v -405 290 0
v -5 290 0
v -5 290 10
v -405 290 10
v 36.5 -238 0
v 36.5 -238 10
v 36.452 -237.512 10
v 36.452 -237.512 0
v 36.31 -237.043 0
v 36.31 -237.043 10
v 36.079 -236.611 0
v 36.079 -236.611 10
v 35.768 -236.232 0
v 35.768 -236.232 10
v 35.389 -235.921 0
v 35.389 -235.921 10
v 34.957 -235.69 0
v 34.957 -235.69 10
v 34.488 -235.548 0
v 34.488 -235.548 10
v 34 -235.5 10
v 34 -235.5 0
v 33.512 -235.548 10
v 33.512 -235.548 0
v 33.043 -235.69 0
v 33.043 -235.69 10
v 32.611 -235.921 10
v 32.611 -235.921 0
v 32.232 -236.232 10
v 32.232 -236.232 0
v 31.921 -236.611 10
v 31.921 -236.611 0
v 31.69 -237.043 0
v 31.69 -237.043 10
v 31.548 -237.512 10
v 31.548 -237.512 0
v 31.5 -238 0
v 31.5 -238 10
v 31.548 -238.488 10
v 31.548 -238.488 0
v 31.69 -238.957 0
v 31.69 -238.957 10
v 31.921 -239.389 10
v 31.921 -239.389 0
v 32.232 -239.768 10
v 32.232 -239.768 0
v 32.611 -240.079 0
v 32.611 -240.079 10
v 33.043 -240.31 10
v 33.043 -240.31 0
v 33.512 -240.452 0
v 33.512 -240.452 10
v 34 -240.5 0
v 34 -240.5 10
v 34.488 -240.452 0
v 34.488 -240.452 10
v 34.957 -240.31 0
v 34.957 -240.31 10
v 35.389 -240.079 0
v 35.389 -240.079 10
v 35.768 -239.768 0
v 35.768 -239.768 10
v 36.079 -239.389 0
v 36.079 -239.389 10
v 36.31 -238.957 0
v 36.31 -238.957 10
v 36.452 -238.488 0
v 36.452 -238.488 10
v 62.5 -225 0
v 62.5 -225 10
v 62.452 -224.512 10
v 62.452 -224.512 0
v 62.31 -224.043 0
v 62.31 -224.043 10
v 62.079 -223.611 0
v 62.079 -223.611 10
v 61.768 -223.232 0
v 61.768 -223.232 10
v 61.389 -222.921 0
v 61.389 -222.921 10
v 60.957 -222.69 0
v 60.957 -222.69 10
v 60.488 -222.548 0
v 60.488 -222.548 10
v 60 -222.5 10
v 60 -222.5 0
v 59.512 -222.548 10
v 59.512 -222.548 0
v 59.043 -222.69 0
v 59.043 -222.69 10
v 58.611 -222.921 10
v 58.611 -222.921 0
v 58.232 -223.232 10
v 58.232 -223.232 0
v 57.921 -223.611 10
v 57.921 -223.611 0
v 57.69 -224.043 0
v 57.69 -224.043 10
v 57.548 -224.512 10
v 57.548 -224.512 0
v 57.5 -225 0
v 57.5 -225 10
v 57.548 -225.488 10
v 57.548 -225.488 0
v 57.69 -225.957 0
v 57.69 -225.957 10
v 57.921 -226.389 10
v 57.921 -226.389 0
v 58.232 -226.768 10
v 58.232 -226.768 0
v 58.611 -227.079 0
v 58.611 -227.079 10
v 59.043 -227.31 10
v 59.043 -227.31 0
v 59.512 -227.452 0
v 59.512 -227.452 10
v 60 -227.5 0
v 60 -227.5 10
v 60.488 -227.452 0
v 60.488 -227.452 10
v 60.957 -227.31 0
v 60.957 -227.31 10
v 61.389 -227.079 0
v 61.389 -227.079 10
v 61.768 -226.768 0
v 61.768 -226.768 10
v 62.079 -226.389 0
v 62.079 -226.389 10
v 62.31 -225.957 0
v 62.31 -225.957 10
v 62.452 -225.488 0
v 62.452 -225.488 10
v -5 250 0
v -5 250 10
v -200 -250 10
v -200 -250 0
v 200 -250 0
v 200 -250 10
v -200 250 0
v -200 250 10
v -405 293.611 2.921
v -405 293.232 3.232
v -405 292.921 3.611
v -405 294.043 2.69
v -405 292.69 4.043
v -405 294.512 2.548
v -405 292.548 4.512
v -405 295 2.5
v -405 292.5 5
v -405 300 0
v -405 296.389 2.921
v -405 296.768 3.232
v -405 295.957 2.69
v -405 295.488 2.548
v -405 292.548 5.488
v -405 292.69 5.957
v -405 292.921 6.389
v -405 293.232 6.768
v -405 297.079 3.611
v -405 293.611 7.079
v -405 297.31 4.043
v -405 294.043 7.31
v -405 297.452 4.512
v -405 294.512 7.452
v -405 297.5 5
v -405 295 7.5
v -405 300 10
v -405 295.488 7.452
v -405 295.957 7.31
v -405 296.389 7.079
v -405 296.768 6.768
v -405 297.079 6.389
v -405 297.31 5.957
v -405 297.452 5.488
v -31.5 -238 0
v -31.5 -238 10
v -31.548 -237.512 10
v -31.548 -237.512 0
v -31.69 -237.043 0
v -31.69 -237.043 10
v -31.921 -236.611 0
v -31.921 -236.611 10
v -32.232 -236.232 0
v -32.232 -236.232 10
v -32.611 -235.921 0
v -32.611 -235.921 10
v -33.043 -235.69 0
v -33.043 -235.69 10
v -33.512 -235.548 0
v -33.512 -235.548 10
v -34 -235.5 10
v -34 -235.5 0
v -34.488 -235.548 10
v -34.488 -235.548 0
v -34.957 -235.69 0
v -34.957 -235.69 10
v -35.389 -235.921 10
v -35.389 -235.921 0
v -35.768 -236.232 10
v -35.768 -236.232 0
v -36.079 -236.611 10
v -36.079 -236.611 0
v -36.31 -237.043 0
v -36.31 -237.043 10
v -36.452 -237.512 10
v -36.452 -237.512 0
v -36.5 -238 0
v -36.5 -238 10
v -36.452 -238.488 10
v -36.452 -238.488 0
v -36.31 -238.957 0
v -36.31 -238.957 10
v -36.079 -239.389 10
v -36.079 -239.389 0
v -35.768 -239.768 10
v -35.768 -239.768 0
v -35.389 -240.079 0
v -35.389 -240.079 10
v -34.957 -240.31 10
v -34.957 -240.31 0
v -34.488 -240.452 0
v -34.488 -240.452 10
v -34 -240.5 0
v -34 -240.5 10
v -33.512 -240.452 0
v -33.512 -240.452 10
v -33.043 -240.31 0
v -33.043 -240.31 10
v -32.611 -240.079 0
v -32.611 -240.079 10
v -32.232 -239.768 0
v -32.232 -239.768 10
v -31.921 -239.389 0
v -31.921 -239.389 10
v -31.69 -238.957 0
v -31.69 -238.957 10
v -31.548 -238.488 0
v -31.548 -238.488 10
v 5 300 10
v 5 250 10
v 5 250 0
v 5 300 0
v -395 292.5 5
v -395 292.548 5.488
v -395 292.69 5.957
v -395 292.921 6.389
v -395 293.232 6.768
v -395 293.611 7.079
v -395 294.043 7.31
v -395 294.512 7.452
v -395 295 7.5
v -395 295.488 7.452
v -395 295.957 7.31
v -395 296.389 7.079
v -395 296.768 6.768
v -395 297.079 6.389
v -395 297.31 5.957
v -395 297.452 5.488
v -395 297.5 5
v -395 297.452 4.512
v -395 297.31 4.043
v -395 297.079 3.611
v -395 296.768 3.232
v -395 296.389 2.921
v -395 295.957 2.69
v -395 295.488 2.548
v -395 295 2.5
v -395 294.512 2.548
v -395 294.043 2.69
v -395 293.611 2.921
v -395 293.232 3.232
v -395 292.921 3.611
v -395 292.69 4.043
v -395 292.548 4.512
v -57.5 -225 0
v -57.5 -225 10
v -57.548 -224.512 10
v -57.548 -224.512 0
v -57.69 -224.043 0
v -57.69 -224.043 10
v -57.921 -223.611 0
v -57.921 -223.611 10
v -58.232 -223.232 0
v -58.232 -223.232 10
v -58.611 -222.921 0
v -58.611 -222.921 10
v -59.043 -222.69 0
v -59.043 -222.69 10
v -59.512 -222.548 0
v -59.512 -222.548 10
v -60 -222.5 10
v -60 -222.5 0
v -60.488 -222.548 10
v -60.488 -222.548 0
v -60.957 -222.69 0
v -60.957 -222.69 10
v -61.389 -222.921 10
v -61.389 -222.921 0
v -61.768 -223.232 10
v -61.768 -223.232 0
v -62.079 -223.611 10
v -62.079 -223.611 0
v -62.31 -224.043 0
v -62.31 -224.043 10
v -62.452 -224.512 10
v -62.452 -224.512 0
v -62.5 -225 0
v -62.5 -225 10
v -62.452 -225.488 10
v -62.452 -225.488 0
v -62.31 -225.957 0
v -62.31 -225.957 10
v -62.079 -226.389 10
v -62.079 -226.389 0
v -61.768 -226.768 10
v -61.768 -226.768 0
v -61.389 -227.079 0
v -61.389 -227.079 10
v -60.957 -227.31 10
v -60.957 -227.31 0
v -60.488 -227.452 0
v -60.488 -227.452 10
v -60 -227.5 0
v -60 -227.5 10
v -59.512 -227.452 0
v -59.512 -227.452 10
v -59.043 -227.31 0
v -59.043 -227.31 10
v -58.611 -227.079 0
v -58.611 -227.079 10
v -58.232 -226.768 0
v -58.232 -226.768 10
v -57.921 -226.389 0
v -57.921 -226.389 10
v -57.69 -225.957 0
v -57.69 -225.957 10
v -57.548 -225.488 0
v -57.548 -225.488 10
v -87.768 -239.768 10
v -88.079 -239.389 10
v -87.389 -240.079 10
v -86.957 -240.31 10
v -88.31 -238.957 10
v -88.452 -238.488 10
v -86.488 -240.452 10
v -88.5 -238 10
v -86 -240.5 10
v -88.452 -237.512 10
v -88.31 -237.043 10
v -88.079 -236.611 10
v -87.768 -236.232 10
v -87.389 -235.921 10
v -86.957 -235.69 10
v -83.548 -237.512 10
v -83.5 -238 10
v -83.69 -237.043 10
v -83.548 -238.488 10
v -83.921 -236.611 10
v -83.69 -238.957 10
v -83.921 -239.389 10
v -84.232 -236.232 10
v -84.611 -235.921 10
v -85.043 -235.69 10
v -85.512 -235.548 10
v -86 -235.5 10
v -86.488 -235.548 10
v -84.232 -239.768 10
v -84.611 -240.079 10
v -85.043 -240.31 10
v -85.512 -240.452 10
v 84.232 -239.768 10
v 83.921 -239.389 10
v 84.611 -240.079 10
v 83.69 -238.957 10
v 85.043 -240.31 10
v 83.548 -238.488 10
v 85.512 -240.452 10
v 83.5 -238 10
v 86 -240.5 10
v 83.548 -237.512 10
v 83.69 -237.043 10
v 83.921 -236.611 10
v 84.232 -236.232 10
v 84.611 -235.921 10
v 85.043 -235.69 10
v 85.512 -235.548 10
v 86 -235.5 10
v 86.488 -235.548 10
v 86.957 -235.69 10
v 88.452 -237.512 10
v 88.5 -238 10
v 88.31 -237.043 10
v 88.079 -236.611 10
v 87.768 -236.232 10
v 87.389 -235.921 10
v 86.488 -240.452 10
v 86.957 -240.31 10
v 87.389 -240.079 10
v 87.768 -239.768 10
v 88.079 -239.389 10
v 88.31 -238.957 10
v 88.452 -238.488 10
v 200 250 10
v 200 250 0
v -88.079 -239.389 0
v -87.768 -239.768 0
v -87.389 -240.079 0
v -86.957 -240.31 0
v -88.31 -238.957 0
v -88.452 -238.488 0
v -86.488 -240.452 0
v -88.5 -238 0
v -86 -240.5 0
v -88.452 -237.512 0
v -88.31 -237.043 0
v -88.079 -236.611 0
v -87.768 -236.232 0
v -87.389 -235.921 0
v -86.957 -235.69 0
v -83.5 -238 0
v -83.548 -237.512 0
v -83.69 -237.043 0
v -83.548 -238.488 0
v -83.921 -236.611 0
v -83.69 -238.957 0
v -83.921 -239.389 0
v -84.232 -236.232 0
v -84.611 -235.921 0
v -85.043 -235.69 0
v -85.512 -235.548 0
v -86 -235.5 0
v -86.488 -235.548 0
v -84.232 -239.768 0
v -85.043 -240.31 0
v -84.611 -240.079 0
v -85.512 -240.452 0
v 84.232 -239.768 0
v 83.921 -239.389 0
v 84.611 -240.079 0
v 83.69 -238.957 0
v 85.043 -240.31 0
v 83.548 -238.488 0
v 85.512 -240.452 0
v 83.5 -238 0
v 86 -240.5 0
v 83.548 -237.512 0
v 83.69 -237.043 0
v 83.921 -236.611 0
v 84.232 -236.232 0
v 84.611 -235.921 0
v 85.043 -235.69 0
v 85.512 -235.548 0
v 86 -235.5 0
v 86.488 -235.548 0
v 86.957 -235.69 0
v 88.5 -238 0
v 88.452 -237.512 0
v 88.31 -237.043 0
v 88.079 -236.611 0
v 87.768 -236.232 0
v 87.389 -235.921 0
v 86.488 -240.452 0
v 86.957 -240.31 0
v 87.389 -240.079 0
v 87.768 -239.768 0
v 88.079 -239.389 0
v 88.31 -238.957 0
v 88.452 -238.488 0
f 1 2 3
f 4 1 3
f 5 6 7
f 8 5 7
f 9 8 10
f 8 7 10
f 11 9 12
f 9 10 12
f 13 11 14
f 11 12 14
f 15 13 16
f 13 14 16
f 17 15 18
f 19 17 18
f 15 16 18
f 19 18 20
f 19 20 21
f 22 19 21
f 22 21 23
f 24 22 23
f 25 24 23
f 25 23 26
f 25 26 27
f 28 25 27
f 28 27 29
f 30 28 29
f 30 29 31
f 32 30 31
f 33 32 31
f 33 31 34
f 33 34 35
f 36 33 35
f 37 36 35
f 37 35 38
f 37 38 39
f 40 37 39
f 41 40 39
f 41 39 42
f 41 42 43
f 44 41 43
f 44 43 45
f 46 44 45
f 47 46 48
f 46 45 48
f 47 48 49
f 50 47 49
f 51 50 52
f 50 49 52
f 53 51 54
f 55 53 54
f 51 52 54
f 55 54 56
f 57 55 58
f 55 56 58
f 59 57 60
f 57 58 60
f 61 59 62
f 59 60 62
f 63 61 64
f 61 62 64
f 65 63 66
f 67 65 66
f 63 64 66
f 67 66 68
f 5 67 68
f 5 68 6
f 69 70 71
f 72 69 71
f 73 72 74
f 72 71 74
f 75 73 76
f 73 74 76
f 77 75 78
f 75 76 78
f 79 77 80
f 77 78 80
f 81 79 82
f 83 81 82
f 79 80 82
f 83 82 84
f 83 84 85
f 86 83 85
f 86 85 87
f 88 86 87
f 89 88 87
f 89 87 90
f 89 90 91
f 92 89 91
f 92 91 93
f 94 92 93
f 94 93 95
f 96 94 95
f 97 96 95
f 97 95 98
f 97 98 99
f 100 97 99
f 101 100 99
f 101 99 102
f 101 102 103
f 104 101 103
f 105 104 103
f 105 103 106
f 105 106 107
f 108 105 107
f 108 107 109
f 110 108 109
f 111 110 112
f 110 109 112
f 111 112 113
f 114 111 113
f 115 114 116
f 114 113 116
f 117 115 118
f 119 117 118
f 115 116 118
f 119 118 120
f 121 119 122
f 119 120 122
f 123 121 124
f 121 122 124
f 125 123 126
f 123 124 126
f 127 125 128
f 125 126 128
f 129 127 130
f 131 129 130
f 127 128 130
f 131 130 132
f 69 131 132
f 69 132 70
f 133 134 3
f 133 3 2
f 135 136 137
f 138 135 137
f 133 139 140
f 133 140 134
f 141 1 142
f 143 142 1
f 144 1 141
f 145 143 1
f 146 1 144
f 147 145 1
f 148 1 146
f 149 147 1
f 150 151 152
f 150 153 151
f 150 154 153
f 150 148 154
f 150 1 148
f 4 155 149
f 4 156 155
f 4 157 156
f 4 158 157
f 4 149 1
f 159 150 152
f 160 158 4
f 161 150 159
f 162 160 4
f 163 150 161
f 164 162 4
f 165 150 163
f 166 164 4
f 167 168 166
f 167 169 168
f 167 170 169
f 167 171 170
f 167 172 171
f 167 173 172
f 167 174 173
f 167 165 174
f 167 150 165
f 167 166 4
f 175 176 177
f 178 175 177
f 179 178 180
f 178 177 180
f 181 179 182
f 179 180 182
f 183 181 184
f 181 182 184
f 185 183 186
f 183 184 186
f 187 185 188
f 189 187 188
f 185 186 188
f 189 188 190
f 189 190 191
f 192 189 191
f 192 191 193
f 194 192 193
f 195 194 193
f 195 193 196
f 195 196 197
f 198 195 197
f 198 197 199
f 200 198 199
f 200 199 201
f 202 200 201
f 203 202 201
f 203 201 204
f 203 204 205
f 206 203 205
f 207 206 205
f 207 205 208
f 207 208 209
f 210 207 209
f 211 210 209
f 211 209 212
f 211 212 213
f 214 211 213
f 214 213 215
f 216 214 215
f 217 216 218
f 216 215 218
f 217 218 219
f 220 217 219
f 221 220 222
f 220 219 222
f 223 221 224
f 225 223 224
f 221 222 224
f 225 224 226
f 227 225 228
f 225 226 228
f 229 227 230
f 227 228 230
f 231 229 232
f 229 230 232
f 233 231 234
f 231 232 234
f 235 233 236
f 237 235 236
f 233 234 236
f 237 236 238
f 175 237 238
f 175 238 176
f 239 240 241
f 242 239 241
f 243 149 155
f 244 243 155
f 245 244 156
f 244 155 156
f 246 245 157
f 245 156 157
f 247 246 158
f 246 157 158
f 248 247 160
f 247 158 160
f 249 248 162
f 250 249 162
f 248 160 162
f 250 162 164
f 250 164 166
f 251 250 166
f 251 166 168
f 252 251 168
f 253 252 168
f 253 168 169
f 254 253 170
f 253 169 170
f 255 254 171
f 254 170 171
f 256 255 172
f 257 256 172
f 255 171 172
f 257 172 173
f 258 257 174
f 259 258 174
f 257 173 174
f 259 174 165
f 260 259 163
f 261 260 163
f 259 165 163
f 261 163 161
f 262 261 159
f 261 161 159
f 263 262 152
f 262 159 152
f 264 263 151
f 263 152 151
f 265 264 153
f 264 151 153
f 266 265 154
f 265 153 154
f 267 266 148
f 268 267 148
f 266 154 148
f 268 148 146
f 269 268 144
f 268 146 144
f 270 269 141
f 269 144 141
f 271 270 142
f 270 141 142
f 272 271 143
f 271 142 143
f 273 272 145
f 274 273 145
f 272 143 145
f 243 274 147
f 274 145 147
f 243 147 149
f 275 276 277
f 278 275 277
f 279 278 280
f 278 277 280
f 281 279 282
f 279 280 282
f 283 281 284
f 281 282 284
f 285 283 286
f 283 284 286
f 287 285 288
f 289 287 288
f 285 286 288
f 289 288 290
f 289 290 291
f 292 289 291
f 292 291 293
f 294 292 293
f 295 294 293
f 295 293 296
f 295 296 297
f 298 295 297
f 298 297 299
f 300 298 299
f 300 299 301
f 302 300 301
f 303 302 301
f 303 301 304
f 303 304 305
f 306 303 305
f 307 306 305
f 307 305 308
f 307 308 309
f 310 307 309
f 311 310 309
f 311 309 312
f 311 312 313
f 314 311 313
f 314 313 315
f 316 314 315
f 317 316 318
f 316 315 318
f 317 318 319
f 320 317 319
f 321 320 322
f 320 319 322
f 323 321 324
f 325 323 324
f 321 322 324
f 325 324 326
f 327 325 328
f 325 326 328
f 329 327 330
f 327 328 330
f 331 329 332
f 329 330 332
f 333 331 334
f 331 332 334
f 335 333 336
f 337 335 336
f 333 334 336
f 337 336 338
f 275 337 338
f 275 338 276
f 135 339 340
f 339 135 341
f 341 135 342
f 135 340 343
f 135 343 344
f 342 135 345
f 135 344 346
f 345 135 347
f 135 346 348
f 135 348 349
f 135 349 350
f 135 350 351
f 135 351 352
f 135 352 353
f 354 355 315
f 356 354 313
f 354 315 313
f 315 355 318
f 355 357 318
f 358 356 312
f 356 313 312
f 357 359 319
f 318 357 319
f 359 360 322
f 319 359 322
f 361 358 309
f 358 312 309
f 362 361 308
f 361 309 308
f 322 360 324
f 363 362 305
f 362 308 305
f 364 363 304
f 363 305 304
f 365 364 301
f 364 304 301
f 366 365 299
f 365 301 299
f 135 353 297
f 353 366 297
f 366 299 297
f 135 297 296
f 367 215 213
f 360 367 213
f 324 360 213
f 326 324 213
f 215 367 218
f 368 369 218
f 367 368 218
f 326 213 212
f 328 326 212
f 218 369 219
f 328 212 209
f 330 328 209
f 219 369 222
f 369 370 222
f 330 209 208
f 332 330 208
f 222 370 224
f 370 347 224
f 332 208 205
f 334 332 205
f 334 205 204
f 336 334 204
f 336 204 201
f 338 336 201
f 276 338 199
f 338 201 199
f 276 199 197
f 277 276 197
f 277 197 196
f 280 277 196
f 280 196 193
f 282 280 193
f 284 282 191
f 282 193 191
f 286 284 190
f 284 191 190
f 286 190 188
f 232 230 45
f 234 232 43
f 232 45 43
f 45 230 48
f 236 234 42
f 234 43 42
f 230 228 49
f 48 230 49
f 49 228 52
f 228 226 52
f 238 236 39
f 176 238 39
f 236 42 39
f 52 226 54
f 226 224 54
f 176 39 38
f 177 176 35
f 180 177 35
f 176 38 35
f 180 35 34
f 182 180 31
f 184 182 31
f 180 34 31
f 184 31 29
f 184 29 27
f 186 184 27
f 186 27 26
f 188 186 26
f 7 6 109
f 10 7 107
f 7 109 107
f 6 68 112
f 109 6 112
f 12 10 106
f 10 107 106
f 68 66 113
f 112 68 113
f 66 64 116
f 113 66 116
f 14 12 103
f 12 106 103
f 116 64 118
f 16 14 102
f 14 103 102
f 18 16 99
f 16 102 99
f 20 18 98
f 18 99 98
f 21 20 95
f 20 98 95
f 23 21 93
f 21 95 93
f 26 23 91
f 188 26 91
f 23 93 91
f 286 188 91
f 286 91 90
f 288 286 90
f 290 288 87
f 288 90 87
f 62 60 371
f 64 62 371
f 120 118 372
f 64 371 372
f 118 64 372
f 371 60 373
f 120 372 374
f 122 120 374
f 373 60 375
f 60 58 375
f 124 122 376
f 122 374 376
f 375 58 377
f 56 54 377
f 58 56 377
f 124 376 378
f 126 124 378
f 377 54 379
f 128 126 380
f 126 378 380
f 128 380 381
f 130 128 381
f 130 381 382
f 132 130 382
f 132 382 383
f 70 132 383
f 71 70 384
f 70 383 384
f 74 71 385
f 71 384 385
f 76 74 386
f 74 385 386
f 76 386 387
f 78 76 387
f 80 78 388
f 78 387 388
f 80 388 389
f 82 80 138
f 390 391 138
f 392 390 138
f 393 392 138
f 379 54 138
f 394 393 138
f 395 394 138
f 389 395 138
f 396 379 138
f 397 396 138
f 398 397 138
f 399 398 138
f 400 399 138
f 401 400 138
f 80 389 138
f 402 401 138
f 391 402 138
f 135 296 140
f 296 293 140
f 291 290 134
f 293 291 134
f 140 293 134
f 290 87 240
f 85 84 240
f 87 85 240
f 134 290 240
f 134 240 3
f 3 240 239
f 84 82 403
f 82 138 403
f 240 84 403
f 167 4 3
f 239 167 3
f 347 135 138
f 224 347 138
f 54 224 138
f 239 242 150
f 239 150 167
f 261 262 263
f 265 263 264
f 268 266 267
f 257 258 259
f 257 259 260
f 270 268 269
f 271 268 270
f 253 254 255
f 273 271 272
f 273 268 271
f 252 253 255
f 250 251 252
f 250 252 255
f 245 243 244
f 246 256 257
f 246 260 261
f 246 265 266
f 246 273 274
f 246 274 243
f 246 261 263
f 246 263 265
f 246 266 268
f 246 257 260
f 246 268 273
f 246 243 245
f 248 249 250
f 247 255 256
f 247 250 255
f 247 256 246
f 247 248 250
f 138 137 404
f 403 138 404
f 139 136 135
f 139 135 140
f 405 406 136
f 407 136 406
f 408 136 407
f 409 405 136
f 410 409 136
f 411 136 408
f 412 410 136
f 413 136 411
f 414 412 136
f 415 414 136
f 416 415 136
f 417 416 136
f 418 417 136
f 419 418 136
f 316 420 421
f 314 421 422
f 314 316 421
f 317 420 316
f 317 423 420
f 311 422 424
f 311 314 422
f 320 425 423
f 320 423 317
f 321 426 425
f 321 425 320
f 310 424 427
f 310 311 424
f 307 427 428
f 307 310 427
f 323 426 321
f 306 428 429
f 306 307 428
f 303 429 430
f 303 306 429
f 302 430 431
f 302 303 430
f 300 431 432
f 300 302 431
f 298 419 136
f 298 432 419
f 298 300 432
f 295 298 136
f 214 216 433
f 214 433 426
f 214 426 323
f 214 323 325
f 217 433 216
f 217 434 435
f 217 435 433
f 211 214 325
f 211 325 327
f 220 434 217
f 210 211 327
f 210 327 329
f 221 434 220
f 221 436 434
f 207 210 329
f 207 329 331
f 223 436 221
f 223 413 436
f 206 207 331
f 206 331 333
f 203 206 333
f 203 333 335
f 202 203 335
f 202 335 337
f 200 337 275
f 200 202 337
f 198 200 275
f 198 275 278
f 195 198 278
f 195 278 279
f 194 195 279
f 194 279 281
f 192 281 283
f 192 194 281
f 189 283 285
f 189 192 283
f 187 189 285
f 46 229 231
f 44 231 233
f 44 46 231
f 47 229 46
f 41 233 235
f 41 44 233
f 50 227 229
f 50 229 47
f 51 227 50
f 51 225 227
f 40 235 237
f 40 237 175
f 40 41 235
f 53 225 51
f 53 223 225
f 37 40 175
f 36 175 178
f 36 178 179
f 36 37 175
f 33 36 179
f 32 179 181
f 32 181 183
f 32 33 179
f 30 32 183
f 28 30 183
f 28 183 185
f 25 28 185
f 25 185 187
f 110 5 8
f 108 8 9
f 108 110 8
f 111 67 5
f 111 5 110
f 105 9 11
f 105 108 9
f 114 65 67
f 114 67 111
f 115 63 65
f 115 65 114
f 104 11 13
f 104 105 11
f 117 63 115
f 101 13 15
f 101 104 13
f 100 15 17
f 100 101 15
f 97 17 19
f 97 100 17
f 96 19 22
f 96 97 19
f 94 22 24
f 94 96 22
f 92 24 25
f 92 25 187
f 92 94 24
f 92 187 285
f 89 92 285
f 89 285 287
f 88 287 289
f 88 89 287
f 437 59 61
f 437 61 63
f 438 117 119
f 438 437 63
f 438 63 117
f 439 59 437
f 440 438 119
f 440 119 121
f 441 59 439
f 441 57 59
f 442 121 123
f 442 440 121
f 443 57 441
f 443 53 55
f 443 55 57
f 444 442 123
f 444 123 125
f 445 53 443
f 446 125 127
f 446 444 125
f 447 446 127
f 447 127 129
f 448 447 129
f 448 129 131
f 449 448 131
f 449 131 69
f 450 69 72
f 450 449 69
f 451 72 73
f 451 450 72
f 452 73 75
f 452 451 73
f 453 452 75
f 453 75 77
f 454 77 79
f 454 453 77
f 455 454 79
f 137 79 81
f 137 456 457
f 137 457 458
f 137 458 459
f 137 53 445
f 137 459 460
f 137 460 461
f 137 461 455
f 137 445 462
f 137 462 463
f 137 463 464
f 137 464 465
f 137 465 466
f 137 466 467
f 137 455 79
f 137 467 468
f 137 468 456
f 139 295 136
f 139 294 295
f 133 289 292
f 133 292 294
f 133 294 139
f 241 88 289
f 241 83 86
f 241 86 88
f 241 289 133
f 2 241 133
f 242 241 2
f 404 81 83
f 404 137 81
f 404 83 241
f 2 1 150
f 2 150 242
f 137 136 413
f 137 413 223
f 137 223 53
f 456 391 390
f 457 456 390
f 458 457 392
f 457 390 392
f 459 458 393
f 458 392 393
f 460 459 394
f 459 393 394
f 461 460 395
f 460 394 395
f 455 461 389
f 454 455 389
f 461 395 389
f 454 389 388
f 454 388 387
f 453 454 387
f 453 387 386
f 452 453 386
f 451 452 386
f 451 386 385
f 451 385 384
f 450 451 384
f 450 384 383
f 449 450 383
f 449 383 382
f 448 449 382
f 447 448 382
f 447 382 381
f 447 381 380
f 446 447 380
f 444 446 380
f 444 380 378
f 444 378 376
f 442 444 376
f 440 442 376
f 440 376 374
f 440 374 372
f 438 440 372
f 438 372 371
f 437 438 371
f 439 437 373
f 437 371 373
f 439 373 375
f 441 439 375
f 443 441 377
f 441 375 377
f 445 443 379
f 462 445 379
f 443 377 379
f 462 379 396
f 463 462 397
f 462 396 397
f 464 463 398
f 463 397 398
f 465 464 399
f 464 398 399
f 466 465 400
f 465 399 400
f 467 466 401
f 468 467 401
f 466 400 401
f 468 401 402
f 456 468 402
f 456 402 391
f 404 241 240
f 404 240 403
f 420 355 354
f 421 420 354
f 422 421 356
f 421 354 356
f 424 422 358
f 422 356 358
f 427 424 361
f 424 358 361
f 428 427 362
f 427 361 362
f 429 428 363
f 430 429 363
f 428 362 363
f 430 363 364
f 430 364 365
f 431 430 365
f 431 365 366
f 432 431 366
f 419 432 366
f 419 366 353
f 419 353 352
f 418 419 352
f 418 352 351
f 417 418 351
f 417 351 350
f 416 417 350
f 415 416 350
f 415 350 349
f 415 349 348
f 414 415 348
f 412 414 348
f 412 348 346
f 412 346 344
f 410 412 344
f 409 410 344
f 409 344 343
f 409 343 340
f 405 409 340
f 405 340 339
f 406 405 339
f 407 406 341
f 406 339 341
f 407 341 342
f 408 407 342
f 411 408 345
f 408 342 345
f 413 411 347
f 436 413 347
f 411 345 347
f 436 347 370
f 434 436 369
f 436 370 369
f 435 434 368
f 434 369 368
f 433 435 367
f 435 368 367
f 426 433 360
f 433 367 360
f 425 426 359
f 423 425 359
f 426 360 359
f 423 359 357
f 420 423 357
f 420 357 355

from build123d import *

# Parameters (mm, degrees)
SKETCH1_W           = 400
SKETCH1_H           = 500
BOSS_EXTRUDE1_DEPTH = 10
SKETCH2_R           = 2.5
CUT_EXTRUDE1_DEPTH  = 321.312347561
SKETCH3_W           = 10
SKETCH3_H           = 10
BOSS_EXTRUDE2_DEPTH = 50
SKETCH4_W           = 10
SKETCH4_H           = 10
BOSS_EXTRUDE3_DEPTH = 400
SKETCH5_R           = 2.5
CUT_EXTRUDE2_DEPTH  = 10


with BuildPart() as part:
    # Sketch1 → Boss-Extrude1 (new body)
    with BuildSketch(Plane.XY):
        Rectangle(SKETCH1_W, SKETCH1_H)
    extrude(amount=BOSS_EXTRUDE1_DEPTH)

    # Sketch2 → Cut-Extrude1 (cut, through all)
    with BuildSketch(Plane.XY.offset(10)):
        with Locations((-86, -238)):
            Circle(SKETCH2_R)
        with Locations((-60, -225)):
            Circle(SKETCH2_R)
        with Locations((-34, -238)):
            Circle(SKETCH2_R)
        with Locations((34, -238)):
            Circle(SKETCH2_R)
        with Locations((60, -225)):
            Circle(SKETCH2_R)
        with Locations((86, -238)):
            Circle(SKETCH2_R)
    extrude(amount=-CUT_EXTRUDE1_DEPTH, mode=Mode.SUBTRACT)

    # Sketch3 → Boss-Extrude2 (add)
    with BuildSketch(Plane(origin=(0, 250, 0), x_dir=(1, 0, 0), z_dir=(0, 1, 0))):
        with Locations((0, -5)):
            Rectangle(SKETCH3_W, SKETCH3_H)
    extrude(amount=BOSS_EXTRUDE2_DEPTH)

    # Sketch4 → Boss-Extrude3 (add)
    with BuildSketch(Plane.ZY.offset(5)):
        with Locations((5, 295)):
            Rectangle(SKETCH4_W, SKETCH4_H)
    extrude(amount=BOSS_EXTRUDE3_DEPTH)

    # Sketch5 → Cut-Extrude2 (cut)
    with BuildSketch(Plane.ZY.offset(405)):
        with Locations(Location((5, 295, 0), (0, 0, 270))):
            Circle(SKETCH5_R)
    extrude(amount=-CUT_EXTRUDE2_DEPTH, mode=Mode.SUBTRACT)


solid = part.part
